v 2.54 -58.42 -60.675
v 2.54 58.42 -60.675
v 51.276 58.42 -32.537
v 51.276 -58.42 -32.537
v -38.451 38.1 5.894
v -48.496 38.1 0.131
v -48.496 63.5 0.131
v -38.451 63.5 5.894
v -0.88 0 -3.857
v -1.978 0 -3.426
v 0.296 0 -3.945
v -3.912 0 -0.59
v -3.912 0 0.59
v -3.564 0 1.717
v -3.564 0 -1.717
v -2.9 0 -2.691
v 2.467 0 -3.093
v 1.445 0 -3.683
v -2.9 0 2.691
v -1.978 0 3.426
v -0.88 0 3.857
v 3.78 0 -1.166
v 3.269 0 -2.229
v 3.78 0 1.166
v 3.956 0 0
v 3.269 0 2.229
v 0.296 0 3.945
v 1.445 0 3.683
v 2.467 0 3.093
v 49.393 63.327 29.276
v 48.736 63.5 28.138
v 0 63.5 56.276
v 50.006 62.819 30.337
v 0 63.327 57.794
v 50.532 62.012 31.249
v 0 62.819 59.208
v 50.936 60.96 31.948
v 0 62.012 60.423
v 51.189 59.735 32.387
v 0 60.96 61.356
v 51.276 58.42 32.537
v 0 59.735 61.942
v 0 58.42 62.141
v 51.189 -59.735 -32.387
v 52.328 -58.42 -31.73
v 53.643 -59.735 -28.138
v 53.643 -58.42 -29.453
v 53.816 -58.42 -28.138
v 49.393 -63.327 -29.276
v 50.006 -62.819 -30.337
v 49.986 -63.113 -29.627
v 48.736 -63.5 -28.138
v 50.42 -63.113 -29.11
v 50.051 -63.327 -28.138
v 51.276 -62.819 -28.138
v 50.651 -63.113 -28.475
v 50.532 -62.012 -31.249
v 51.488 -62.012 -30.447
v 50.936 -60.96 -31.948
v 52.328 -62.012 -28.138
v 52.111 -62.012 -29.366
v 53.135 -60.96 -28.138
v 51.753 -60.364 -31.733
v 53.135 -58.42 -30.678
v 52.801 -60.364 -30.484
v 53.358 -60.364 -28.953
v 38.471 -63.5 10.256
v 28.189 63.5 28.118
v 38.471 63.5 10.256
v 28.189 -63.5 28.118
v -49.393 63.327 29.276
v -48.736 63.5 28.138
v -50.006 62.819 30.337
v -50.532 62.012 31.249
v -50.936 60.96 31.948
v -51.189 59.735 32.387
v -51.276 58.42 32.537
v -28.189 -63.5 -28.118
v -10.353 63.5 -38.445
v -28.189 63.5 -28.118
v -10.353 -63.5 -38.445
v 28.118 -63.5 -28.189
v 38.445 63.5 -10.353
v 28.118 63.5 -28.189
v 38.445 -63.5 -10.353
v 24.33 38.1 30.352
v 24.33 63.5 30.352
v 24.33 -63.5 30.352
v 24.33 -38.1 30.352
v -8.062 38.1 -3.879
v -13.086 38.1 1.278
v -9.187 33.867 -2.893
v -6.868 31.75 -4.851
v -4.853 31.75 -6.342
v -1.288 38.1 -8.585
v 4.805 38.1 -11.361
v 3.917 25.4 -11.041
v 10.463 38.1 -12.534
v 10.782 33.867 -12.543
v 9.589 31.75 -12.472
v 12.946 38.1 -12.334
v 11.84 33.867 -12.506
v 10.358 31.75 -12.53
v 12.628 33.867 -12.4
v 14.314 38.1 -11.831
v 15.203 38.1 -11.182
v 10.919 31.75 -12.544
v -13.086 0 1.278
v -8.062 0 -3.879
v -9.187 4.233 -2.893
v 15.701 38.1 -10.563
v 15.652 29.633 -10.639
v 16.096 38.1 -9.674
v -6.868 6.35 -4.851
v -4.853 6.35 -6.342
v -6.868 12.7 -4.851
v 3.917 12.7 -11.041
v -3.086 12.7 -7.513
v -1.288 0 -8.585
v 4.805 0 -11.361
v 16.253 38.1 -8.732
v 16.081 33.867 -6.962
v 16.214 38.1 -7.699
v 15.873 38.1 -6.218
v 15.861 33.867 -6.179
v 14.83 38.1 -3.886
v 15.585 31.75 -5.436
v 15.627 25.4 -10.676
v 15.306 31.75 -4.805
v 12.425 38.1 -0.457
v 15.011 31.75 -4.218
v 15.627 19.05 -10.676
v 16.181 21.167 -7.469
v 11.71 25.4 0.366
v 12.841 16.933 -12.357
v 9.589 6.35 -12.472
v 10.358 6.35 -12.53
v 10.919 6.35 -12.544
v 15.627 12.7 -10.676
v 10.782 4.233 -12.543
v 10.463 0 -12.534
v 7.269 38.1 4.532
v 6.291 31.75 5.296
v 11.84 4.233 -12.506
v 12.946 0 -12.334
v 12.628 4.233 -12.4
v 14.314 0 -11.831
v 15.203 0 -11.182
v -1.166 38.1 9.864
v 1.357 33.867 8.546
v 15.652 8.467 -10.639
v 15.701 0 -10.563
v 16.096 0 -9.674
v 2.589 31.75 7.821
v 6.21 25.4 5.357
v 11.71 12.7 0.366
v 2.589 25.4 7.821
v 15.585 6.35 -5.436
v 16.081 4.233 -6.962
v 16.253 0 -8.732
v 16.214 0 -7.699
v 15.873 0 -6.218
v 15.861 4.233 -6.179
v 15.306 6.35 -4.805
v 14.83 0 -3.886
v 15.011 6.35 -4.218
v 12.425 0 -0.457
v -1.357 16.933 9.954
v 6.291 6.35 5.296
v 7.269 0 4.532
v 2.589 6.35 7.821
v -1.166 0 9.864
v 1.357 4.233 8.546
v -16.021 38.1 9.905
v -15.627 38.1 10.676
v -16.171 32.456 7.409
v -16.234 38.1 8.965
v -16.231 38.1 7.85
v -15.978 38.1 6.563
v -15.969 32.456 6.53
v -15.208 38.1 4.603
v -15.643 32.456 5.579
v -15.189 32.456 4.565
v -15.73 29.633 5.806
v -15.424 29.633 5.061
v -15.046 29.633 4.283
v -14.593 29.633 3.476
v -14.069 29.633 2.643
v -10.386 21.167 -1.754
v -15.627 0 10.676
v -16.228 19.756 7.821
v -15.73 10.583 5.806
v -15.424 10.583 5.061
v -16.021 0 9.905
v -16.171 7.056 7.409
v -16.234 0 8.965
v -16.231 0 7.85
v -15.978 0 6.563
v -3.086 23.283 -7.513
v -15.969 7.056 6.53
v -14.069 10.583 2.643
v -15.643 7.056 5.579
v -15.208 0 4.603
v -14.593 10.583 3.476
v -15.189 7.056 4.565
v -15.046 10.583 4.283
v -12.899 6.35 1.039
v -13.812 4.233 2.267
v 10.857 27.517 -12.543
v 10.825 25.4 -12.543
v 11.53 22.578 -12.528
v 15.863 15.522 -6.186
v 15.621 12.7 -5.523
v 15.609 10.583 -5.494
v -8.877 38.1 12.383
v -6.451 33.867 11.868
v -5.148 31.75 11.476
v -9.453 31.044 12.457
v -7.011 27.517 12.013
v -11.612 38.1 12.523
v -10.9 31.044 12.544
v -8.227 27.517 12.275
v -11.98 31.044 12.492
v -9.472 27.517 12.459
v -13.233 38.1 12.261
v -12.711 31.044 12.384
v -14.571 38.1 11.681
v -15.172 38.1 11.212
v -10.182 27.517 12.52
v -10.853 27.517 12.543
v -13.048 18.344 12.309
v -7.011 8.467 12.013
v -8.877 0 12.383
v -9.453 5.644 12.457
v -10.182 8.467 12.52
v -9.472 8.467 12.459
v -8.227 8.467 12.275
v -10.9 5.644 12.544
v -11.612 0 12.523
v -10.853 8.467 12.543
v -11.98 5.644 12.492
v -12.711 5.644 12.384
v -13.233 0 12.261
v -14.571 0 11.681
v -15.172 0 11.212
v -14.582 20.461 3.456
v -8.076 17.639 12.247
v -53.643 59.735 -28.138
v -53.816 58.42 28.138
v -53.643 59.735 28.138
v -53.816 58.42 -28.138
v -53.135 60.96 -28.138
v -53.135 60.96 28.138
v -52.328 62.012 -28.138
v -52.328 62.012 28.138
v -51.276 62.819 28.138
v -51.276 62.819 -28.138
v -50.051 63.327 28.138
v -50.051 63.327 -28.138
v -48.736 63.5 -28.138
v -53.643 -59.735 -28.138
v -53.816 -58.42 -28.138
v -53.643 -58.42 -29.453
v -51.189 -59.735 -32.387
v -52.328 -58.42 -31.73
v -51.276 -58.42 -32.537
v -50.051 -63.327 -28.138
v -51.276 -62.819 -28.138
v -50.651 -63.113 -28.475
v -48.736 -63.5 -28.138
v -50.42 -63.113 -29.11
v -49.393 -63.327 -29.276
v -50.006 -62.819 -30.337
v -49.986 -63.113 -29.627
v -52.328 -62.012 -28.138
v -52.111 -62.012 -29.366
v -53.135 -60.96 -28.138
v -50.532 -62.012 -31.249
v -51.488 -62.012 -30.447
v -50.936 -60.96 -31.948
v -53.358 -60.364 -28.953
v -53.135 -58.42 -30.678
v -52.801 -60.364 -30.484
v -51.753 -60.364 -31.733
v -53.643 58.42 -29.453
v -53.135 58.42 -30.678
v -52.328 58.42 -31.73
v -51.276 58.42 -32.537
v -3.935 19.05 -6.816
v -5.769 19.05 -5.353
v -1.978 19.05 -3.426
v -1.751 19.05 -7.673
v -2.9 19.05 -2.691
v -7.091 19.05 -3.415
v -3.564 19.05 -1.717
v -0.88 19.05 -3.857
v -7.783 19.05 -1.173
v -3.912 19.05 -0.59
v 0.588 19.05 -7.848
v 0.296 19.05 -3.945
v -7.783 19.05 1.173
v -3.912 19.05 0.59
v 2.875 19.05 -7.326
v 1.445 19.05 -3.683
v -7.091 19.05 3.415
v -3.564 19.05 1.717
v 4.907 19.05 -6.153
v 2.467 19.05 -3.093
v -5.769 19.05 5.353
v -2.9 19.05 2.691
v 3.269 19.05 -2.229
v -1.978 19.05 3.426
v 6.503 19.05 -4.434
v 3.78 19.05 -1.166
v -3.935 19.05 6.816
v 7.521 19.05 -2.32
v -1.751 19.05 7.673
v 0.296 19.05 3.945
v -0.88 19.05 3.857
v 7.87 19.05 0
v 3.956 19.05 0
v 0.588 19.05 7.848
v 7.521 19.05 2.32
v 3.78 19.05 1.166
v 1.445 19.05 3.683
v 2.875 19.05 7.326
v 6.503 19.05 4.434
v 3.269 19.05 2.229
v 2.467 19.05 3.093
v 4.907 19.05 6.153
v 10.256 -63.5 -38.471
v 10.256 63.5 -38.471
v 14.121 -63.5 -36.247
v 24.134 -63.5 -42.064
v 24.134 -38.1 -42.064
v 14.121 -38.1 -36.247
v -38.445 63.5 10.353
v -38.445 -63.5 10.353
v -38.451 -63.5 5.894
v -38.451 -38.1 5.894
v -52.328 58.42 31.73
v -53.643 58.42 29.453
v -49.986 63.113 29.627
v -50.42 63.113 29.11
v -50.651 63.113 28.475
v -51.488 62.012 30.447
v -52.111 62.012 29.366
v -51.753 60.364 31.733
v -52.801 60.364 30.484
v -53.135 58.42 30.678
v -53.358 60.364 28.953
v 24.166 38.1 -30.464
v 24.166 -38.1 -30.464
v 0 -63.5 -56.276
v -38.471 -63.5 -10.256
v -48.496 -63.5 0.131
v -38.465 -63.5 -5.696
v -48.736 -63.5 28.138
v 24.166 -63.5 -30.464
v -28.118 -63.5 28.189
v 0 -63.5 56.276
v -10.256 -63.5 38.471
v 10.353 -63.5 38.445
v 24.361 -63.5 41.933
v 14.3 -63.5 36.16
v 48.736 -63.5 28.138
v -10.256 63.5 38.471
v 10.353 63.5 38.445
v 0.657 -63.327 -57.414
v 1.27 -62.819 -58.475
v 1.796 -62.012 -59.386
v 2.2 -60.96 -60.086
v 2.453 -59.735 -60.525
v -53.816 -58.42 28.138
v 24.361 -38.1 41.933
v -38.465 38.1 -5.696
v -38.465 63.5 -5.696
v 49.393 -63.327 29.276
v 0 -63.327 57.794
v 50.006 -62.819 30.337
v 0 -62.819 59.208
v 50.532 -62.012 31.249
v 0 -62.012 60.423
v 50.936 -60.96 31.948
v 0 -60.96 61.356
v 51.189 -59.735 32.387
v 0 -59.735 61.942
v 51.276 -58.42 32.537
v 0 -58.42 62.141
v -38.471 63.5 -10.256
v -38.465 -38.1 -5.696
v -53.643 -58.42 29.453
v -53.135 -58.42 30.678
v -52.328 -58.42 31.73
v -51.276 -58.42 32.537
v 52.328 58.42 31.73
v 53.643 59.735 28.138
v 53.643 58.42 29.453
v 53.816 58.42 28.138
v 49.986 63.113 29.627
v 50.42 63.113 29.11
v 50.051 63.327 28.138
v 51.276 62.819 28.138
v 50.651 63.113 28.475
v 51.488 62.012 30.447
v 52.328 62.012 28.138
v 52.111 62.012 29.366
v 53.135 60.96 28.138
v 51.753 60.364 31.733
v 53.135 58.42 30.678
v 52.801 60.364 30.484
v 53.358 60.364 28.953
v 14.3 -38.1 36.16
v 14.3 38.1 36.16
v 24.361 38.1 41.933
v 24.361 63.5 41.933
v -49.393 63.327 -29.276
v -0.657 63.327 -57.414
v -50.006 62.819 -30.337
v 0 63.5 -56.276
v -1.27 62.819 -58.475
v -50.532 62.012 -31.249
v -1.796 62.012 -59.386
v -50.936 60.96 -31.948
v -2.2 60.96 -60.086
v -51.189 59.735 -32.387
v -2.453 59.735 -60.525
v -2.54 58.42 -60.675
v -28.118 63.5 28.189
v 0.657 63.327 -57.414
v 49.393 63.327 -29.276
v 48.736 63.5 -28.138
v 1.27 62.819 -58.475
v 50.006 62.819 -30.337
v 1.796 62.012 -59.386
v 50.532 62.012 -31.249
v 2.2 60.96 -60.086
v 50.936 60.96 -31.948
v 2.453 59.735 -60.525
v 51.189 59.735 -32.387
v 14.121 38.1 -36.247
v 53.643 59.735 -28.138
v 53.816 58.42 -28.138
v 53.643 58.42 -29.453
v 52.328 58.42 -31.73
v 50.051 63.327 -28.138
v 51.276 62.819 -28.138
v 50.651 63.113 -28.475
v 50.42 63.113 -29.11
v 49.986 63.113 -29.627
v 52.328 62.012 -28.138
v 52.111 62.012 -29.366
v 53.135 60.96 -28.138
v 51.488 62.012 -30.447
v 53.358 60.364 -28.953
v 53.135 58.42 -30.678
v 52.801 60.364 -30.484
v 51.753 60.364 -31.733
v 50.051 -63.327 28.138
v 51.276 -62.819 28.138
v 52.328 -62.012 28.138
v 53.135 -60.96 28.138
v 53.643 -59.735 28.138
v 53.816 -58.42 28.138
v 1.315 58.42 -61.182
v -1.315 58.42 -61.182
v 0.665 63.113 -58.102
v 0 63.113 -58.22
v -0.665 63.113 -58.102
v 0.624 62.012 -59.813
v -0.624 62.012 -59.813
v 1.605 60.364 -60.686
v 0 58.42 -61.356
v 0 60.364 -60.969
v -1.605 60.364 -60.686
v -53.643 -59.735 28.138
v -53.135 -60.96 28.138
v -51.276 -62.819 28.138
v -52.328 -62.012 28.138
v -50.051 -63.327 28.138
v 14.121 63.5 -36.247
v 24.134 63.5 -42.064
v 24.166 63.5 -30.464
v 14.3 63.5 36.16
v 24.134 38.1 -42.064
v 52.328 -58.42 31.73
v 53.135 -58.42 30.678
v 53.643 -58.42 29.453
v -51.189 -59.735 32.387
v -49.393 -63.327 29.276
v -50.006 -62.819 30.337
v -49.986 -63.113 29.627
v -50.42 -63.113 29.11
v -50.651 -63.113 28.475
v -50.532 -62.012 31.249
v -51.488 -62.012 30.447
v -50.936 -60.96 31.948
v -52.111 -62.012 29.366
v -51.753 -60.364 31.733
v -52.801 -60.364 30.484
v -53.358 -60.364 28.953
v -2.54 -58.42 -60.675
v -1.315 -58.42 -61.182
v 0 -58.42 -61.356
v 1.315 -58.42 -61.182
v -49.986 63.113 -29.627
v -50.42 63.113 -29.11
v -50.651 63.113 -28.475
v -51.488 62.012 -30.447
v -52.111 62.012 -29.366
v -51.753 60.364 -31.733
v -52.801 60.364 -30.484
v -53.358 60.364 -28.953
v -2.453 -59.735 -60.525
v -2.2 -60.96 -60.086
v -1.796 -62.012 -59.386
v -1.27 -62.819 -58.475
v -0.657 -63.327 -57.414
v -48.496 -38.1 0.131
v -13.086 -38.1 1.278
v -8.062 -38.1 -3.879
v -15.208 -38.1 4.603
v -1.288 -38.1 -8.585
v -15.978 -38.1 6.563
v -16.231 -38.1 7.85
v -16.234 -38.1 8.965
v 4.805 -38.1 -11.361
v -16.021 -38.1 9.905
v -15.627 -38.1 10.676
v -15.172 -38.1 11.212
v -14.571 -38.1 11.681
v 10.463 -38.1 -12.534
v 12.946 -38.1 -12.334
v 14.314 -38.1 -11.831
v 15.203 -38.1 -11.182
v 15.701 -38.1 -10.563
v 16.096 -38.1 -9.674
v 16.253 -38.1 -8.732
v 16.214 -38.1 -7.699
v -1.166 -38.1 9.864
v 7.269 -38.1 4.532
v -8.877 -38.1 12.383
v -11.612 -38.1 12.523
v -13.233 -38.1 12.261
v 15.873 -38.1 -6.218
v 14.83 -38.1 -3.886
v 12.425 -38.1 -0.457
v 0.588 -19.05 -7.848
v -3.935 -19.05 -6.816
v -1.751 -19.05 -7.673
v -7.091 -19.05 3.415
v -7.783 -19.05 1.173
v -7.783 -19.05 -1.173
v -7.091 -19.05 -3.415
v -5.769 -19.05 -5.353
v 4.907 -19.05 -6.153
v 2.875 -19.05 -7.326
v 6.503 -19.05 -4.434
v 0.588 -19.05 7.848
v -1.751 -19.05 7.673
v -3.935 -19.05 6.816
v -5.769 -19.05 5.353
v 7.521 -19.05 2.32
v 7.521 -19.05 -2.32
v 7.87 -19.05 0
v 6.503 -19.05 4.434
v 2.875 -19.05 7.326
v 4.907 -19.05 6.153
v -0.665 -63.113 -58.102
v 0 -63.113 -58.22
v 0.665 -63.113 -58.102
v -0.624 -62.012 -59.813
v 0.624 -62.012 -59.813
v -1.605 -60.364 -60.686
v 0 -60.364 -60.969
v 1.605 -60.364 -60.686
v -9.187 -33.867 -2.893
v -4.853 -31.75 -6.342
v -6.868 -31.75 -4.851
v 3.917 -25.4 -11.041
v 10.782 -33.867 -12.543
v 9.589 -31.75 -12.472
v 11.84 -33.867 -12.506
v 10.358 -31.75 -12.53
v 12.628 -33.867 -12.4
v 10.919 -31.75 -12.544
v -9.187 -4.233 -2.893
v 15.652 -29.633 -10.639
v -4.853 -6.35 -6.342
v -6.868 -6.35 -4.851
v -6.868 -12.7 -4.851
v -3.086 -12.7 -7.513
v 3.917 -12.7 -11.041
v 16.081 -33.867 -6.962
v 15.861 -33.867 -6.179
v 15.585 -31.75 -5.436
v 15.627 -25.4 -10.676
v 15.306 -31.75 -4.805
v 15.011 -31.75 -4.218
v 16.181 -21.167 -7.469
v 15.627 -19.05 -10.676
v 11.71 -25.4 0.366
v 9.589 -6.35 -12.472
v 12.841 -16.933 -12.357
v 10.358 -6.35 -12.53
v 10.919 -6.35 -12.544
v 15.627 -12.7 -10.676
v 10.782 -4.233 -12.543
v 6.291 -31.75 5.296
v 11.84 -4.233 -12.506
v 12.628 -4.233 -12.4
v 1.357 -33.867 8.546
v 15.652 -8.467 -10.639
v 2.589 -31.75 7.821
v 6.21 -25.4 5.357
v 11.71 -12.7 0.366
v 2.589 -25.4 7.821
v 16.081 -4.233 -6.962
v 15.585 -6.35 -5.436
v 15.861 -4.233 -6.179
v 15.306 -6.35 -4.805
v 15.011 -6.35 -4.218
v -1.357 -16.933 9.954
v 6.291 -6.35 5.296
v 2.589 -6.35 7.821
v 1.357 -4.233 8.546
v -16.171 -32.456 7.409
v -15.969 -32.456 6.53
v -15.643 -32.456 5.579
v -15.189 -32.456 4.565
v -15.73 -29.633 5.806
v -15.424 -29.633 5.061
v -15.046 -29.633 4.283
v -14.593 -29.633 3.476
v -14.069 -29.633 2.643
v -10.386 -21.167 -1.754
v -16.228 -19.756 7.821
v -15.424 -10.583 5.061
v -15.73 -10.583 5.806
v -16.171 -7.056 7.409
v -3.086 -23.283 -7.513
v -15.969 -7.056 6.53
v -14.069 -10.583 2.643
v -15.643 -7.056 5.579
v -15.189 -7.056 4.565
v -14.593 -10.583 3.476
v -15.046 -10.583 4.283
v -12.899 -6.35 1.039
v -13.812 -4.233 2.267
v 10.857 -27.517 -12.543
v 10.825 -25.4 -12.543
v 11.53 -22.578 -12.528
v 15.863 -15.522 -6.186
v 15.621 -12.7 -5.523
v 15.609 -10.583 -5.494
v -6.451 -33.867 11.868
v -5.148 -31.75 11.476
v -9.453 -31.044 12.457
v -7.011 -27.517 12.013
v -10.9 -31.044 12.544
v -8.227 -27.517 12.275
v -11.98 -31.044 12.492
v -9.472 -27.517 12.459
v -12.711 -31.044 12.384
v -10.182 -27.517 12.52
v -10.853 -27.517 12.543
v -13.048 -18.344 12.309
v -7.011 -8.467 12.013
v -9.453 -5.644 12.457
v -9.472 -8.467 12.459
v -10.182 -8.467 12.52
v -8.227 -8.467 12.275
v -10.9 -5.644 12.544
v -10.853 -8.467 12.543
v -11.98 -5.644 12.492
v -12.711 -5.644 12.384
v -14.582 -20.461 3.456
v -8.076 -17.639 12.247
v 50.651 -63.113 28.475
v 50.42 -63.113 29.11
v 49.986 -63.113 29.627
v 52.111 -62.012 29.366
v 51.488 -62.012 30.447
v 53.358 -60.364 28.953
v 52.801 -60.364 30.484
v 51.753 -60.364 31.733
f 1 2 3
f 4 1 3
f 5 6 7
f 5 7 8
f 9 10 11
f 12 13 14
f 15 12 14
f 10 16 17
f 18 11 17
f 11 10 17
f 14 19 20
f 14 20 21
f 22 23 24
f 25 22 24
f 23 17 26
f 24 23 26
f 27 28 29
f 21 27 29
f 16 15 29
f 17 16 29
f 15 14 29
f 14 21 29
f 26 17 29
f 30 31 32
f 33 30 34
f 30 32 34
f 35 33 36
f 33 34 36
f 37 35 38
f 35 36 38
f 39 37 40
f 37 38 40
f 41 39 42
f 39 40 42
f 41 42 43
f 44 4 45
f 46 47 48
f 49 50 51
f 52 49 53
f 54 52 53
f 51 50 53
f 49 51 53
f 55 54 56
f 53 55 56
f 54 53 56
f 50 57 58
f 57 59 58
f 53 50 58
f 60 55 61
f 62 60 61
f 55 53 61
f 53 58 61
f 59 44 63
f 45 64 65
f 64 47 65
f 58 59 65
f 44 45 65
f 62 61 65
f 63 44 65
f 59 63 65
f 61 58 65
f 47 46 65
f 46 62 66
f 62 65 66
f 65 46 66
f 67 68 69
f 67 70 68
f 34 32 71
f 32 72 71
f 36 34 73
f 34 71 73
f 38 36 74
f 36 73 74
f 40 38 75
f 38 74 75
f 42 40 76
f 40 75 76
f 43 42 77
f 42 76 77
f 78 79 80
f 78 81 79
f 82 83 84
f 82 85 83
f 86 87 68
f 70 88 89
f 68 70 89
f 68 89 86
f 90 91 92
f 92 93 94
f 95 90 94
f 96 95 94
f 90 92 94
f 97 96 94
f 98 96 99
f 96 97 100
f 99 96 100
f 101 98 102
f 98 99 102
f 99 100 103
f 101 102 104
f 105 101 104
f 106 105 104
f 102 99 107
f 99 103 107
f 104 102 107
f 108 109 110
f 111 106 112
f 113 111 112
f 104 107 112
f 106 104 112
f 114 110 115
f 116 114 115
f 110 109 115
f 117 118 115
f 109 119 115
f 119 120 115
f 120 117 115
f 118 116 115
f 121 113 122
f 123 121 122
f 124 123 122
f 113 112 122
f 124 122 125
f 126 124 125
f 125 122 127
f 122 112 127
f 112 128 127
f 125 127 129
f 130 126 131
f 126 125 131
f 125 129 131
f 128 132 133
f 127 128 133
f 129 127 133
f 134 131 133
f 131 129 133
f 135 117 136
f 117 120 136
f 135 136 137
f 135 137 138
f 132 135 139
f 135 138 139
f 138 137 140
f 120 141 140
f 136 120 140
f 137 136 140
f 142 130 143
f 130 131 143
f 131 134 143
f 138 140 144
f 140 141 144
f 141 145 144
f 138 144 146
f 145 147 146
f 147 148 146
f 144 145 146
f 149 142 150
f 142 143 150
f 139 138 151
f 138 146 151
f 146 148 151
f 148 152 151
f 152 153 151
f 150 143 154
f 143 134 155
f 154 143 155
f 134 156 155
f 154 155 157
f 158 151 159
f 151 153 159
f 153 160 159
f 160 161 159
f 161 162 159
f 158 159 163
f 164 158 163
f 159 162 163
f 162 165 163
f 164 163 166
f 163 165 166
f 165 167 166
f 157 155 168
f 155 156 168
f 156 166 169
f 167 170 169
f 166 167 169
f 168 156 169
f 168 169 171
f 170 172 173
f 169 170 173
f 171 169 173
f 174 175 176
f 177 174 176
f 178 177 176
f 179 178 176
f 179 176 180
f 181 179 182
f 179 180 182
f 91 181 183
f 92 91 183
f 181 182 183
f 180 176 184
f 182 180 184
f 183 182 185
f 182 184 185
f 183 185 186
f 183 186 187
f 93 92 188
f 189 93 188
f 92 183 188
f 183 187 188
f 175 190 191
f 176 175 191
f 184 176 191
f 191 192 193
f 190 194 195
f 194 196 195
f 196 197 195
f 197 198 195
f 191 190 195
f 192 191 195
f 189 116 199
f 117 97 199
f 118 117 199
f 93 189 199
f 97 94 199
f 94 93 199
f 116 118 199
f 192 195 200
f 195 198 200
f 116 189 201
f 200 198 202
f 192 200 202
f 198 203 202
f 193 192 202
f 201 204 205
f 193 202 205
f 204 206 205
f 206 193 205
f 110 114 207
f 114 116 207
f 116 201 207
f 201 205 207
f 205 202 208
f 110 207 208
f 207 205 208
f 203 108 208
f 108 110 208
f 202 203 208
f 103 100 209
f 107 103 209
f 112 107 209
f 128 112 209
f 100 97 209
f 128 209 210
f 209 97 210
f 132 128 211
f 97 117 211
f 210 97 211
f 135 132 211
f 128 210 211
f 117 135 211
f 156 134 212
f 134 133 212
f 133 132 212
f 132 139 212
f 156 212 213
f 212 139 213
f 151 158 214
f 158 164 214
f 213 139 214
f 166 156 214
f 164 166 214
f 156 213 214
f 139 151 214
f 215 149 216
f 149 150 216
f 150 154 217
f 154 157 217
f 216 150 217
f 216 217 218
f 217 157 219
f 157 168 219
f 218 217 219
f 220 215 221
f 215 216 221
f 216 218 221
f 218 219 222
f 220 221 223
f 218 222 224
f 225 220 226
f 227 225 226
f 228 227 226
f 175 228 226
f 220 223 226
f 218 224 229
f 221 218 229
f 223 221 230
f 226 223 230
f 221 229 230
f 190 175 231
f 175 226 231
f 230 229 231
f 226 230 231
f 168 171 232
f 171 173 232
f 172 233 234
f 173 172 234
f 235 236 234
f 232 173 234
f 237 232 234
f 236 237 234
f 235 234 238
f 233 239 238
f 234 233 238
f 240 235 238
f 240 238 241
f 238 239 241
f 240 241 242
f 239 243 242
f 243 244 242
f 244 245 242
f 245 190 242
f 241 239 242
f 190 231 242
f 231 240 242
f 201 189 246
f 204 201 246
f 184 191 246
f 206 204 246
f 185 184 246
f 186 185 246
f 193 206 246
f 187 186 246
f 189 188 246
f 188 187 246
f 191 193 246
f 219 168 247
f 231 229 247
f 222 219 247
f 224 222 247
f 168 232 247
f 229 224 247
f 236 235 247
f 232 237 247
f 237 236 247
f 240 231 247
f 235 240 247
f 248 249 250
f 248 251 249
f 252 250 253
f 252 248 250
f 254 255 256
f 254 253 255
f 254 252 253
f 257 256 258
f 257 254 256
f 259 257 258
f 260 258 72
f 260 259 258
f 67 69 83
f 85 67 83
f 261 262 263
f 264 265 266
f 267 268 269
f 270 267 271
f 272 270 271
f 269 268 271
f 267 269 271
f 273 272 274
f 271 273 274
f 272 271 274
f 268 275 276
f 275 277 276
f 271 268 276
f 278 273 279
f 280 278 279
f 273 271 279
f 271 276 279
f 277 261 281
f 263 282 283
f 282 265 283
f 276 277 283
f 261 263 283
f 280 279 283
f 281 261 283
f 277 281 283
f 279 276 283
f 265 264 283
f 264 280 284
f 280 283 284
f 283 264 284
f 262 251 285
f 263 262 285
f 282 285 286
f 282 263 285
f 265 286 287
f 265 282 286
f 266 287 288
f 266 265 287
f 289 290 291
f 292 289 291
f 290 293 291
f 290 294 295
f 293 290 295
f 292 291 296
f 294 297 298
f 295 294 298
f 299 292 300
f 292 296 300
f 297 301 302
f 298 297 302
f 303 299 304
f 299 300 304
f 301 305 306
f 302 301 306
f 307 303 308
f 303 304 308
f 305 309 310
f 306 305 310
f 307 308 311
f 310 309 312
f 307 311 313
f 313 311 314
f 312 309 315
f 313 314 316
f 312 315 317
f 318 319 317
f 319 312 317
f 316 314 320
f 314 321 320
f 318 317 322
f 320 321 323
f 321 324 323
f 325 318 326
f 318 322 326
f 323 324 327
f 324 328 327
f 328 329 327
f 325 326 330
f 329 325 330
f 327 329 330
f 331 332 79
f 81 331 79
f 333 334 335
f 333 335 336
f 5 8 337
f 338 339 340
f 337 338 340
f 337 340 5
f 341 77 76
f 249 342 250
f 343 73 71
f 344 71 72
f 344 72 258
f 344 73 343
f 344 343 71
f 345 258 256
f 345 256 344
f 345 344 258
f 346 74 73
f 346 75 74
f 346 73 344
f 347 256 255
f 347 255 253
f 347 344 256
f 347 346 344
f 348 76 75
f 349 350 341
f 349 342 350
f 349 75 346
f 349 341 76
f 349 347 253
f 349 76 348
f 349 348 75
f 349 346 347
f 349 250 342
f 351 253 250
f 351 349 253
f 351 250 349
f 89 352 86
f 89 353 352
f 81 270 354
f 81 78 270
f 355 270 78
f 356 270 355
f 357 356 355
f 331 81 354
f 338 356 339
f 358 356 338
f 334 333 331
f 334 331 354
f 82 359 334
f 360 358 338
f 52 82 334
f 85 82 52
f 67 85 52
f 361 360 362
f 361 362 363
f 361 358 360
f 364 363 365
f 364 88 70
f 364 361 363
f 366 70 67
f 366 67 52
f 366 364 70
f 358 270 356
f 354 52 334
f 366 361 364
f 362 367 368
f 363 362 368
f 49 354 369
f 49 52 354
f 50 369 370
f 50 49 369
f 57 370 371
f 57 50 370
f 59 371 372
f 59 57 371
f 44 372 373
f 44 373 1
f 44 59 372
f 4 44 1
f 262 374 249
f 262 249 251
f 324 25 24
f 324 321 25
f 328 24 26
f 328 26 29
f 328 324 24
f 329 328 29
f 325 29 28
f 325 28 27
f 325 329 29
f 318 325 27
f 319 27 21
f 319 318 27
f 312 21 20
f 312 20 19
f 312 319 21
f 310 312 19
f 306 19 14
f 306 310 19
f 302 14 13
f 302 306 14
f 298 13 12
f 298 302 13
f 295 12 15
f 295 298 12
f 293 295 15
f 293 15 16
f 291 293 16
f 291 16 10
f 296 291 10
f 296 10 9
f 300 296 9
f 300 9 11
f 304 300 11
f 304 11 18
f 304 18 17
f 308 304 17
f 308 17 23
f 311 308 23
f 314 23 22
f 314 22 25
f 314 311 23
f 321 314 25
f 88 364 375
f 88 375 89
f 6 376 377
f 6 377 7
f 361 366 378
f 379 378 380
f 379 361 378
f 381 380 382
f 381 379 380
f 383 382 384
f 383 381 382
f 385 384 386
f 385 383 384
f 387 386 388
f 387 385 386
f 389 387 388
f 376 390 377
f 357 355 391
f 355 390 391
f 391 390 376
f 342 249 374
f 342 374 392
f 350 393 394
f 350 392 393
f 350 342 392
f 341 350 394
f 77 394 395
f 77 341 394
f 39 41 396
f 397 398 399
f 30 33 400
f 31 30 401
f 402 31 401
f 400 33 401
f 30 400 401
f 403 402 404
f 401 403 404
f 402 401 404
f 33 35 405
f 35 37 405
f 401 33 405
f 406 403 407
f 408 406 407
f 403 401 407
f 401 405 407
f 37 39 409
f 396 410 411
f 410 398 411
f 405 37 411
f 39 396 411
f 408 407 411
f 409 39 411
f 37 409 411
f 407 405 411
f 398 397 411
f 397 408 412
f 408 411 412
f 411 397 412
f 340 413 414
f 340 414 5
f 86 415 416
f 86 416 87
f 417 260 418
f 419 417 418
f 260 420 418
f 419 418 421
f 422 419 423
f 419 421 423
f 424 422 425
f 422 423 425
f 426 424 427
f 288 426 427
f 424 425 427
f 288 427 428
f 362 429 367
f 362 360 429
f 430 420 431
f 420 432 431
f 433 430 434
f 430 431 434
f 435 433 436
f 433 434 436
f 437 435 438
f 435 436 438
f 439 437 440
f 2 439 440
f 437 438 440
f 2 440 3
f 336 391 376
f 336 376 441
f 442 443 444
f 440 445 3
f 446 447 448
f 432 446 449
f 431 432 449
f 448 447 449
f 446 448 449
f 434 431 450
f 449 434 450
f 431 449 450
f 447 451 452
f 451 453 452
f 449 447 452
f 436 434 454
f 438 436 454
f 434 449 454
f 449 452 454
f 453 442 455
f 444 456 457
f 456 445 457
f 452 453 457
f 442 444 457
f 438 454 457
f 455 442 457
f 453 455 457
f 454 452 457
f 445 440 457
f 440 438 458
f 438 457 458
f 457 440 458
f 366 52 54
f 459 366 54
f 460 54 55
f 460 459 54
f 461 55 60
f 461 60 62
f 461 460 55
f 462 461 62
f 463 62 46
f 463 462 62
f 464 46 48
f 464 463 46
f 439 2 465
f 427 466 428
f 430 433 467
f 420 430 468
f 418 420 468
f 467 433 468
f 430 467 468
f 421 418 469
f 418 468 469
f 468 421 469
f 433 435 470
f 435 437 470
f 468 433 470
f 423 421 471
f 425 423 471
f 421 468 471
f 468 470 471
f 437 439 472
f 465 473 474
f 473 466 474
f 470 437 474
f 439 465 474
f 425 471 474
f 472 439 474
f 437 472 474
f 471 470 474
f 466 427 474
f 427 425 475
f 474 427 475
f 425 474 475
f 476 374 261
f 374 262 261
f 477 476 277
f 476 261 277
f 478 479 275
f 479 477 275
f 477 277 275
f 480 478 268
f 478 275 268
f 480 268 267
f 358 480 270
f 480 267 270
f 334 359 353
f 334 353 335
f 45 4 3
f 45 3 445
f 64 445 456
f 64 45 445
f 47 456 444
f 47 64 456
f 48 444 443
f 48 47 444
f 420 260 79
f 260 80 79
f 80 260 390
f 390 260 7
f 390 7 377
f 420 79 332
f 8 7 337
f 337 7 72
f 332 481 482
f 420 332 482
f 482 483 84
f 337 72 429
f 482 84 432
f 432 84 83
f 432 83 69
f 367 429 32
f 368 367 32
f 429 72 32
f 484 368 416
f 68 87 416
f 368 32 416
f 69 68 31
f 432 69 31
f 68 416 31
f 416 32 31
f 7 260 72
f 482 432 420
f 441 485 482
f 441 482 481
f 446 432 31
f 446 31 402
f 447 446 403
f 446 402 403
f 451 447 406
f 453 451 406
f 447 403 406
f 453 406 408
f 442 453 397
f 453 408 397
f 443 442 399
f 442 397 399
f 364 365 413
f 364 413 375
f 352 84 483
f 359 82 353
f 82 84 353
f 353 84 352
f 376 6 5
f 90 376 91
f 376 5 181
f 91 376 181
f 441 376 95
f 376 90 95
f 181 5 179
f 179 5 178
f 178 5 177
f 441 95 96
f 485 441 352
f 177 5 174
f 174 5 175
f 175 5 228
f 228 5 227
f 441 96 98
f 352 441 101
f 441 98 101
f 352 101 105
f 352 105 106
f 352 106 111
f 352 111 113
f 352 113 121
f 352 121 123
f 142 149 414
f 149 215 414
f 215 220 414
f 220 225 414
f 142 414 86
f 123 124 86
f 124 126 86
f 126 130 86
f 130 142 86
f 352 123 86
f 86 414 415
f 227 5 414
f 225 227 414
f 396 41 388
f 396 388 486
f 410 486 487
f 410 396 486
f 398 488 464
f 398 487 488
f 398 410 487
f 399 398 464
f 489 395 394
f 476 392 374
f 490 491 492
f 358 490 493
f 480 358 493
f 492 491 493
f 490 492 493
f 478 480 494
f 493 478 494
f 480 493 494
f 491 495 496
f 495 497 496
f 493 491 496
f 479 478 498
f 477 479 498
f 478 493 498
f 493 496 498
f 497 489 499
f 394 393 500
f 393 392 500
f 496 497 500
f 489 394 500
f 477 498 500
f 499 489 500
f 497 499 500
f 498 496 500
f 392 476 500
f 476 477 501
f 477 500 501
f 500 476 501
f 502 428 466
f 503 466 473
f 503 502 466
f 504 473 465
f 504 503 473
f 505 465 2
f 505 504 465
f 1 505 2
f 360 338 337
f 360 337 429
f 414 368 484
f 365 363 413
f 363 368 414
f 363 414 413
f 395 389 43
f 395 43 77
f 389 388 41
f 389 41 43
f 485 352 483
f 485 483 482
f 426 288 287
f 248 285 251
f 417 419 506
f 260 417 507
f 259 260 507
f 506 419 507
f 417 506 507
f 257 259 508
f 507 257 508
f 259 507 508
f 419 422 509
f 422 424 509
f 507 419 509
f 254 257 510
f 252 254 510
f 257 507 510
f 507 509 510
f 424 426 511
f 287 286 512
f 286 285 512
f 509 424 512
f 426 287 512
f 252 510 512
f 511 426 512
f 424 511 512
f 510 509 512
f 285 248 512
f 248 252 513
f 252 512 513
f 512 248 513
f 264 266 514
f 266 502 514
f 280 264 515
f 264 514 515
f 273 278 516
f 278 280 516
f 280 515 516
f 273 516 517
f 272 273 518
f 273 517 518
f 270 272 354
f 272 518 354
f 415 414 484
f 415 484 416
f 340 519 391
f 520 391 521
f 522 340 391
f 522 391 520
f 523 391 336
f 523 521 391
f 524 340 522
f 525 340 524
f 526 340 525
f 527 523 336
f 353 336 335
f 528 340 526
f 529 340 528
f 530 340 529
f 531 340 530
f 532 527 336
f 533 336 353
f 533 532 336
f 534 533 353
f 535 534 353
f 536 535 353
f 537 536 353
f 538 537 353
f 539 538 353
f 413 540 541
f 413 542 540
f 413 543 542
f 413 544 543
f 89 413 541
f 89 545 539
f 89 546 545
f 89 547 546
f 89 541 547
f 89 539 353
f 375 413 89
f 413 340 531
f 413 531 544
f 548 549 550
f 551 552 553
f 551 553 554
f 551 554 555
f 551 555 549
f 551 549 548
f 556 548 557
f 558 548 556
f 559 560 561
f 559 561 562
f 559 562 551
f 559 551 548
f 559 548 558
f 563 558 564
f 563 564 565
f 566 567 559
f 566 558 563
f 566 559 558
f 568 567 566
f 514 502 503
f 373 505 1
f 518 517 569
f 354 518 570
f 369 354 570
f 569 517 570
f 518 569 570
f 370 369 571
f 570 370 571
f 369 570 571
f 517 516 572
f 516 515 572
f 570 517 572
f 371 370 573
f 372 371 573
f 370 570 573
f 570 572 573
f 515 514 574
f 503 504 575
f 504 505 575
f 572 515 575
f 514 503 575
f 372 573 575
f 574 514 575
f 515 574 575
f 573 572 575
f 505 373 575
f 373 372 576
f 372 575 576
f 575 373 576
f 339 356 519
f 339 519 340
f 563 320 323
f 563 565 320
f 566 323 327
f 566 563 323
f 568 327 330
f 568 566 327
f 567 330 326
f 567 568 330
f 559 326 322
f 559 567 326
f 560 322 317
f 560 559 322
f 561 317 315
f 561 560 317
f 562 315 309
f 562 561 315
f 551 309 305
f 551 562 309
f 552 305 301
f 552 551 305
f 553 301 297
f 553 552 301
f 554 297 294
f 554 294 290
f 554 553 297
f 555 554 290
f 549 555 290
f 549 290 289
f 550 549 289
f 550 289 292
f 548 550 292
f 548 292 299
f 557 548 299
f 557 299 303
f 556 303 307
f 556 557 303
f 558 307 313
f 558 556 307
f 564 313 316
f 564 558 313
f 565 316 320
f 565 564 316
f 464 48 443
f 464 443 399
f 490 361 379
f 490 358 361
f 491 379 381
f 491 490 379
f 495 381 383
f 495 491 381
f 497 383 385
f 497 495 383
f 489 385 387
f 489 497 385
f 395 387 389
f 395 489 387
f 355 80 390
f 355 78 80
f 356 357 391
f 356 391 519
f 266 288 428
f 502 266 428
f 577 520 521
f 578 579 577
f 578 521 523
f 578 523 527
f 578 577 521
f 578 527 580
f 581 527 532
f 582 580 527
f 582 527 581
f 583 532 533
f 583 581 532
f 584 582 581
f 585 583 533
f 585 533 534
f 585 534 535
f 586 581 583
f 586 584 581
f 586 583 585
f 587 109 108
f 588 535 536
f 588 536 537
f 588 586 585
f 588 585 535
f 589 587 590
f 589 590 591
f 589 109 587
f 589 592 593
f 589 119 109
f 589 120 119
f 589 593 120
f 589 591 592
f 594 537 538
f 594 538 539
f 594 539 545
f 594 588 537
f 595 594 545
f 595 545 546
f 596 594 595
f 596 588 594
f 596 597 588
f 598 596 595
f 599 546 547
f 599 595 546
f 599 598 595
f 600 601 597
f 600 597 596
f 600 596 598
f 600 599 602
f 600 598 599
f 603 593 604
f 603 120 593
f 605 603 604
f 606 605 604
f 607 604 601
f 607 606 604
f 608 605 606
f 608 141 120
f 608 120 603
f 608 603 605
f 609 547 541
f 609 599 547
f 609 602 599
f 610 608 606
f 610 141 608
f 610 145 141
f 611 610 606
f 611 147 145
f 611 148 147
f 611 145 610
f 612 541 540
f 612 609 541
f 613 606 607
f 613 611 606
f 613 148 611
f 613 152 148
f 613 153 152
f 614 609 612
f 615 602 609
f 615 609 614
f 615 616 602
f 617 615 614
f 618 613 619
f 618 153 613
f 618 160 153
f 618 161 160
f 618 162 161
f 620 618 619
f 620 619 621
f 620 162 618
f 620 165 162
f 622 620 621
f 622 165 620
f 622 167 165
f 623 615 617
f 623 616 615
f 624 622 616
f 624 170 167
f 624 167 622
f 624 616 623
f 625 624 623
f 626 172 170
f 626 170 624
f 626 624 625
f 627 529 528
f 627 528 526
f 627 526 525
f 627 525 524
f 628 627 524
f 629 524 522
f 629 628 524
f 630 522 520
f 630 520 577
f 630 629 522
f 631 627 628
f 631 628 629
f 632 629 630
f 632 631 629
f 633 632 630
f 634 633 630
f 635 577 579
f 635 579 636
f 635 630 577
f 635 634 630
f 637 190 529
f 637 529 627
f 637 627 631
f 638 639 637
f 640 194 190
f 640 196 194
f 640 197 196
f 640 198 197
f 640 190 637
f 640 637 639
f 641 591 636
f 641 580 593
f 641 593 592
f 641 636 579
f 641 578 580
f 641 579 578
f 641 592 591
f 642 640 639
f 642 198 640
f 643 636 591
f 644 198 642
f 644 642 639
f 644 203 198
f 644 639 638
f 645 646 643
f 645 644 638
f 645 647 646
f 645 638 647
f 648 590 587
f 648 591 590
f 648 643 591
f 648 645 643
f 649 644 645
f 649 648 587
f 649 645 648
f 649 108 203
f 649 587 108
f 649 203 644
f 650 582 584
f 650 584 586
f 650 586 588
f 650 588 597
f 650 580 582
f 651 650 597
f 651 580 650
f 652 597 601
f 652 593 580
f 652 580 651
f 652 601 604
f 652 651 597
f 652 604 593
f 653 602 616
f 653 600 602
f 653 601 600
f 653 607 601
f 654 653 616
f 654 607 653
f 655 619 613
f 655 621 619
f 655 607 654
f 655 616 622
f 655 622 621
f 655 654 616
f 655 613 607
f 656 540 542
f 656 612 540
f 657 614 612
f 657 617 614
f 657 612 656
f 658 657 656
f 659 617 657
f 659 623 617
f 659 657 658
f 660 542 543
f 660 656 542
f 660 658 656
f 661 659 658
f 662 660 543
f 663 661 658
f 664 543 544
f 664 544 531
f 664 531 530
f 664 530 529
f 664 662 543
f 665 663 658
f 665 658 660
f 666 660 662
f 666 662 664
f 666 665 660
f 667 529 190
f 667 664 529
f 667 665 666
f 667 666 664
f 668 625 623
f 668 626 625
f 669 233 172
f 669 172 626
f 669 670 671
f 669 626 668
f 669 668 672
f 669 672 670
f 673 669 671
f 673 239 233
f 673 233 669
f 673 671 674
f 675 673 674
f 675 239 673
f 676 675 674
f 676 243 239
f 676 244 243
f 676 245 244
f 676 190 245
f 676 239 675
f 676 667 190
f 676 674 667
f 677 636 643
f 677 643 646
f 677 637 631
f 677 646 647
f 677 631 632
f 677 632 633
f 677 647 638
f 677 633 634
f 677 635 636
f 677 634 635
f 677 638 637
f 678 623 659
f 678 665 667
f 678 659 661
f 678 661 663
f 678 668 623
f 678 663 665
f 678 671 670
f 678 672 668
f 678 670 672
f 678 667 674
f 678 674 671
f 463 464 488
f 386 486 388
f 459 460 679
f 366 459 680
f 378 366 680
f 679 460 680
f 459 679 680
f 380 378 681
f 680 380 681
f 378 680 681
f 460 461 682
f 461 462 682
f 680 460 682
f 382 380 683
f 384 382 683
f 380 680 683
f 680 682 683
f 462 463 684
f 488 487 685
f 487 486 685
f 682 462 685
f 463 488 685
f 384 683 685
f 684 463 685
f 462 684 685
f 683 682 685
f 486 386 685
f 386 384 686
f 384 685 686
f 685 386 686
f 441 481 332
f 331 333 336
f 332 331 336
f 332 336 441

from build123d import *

# Parameters (mm, degrees)
F1_DEPTH = 63.5
F2_DEPTH = 38.1
F0_R     = 7.8704137821
F0_R_2   = 3.9561577287
F3_DEPTH = 19.05
F4_DEPTH = 19.05
F5_R     = 5.08


with BuildPart() as f1:
    # F0 (on Front) → F1 (new body, symmetric)
    with BuildSketch(Plane.XZ):
        Polygon((-53.8160167634, 31.0706917651), (-53.8160167634, -31.0706917651), (0, -62.1413835302), (53.8160167634, -31.0706917651), (53.8160167634, 31.0706917651), (0, 62.1413835302), align=None)
        Polygon((-38.4452722254, 10.3533287005), (-28.1179180524, 28.188881781), (-10.2563904444, 38.4712467528), (10.3533287005, 38.4452722254), (14.2997728233, 36.16015519), (24.3612338289, 41.932971005), (24.3299605233, 30.352356557), (28.188881781, 28.1179180524), (38.4712467528, 10.2563904444), (38.4452722254, -10.3533287005), (28.1179180524, -28.188881781), (24.1657265876, -30.4640441283), (24.134401232, -42.0639328659), (14.1209315815, -36.2465421647), (10.2563904444, -38.4712467528), (-10.3533287005, -38.4452722254), (-28.188881781, -28.1179180524), (-38.4712467528, -10.2563904444), (-38.4654994109, -5.6961110617), (-48.4956350609, 0.1309618609), (-38.4508921047, 5.8941856077), align=None, mode=Mode.SUBTRACT)
    extrude(amount=F1_DEPTH, both=True)

    # F0 (on Front) → F2 (join, symmetric)
    with BuildSketch(Plane.XZ):
        Polygon((24.3612338289, 41.932971005), (14.2997728233, 36.16015519), (24.3299605233, 30.352356557), align=None)
        Polygon((-38.4654994109, -5.6961110617), (-38.4508921047, 5.8941856077), (-48.4956350609, 0.1309618609), align=None)
        Polygon((24.1657265876, -30.4640441283), (14.1209315815, -36.2465421647), (24.134401232, -42.0639328659), align=None)
        Polygon((14.2997728233, 36.16015519), (-38.4508921047, 5.8941856077), (-38.4654994109, -5.6961110617), (14.1209315815, -36.2465421647), (24.1657265876, -30.4640441283), (24.3299605233, 30.352356557), align=None)
        with BuildLine():
            add(Edge.make_bspline(
                [(-15.6271792948, 10.6756715104), (-23.4198652546, -0.7313580674), (3.9172466675, -11.0413505441), (31.2543585896, -21.3513430208), (11.7099326273, 0.3656790337), (-7.834493335, 22.0827010882), (-15.6271792948, 10.6756715104)],
                knots=[0, 0, 0, 2.0943951024, 2.0943951024, 4.1887902048, 4.1887902048, 6.2831853072, 6.2831853072, 6.2831853072], degree=2, weights=[1, 0.5, 1, 0.5, 1, 0.5, 1]))
        make_face(mode=Mode.SUBTRACT)
    extrude(amount=F2_DEPTH, both=True)

    # F5
    f5_edges = [f1.edges().sort_by_distance(p)[0] for p in [
        (53.816017, 0, 31.070692),
        (53.816017, 0, -31.070692),
        (0, 0, -62.141384),
        (-53.816017, 0, -31.070692),
        (-53.816017, 0, 31.070692),
        (-26.908008, -63.5, 46.606038),
        (-53.816017, -63.5, 0),
        (-26.908008, -63.5, -46.606038),
        (26.908008, -63.5, -46.606038),
        (53.816017, -63.5, 0),
        (26.908008, -63.5, 46.606038),
        (26.908008, 63.5, 46.606038),
        (-26.908008, 63.5, 46.606038),
        (53.816017, 63.5, 0),
        (26.908008, 63.5, -46.606038),
        (-26.908008, 63.5, -46.606038),
        (-53.816017, 63.5, 0),
    ]]
    fillet(f5_edges, radius=F5_R)


with BuildPart() as f3:
    # F0 (on Front) → F3 (new body, symmetric)
    with BuildSketch(Plane.XZ):
        Circle(F0_R)
        Circle(F0_R_2, mode=Mode.SUBTRACT)
    extrude(amount=F3_DEPTH, both=True)

    # F0 (on Front) → F4 (join)
    with BuildSketch(Plane.XZ):
        Circle(F0_R_2)
    extrude(amount=F4_DEPTH)


solid = Compound([f1.part, f3.part])
